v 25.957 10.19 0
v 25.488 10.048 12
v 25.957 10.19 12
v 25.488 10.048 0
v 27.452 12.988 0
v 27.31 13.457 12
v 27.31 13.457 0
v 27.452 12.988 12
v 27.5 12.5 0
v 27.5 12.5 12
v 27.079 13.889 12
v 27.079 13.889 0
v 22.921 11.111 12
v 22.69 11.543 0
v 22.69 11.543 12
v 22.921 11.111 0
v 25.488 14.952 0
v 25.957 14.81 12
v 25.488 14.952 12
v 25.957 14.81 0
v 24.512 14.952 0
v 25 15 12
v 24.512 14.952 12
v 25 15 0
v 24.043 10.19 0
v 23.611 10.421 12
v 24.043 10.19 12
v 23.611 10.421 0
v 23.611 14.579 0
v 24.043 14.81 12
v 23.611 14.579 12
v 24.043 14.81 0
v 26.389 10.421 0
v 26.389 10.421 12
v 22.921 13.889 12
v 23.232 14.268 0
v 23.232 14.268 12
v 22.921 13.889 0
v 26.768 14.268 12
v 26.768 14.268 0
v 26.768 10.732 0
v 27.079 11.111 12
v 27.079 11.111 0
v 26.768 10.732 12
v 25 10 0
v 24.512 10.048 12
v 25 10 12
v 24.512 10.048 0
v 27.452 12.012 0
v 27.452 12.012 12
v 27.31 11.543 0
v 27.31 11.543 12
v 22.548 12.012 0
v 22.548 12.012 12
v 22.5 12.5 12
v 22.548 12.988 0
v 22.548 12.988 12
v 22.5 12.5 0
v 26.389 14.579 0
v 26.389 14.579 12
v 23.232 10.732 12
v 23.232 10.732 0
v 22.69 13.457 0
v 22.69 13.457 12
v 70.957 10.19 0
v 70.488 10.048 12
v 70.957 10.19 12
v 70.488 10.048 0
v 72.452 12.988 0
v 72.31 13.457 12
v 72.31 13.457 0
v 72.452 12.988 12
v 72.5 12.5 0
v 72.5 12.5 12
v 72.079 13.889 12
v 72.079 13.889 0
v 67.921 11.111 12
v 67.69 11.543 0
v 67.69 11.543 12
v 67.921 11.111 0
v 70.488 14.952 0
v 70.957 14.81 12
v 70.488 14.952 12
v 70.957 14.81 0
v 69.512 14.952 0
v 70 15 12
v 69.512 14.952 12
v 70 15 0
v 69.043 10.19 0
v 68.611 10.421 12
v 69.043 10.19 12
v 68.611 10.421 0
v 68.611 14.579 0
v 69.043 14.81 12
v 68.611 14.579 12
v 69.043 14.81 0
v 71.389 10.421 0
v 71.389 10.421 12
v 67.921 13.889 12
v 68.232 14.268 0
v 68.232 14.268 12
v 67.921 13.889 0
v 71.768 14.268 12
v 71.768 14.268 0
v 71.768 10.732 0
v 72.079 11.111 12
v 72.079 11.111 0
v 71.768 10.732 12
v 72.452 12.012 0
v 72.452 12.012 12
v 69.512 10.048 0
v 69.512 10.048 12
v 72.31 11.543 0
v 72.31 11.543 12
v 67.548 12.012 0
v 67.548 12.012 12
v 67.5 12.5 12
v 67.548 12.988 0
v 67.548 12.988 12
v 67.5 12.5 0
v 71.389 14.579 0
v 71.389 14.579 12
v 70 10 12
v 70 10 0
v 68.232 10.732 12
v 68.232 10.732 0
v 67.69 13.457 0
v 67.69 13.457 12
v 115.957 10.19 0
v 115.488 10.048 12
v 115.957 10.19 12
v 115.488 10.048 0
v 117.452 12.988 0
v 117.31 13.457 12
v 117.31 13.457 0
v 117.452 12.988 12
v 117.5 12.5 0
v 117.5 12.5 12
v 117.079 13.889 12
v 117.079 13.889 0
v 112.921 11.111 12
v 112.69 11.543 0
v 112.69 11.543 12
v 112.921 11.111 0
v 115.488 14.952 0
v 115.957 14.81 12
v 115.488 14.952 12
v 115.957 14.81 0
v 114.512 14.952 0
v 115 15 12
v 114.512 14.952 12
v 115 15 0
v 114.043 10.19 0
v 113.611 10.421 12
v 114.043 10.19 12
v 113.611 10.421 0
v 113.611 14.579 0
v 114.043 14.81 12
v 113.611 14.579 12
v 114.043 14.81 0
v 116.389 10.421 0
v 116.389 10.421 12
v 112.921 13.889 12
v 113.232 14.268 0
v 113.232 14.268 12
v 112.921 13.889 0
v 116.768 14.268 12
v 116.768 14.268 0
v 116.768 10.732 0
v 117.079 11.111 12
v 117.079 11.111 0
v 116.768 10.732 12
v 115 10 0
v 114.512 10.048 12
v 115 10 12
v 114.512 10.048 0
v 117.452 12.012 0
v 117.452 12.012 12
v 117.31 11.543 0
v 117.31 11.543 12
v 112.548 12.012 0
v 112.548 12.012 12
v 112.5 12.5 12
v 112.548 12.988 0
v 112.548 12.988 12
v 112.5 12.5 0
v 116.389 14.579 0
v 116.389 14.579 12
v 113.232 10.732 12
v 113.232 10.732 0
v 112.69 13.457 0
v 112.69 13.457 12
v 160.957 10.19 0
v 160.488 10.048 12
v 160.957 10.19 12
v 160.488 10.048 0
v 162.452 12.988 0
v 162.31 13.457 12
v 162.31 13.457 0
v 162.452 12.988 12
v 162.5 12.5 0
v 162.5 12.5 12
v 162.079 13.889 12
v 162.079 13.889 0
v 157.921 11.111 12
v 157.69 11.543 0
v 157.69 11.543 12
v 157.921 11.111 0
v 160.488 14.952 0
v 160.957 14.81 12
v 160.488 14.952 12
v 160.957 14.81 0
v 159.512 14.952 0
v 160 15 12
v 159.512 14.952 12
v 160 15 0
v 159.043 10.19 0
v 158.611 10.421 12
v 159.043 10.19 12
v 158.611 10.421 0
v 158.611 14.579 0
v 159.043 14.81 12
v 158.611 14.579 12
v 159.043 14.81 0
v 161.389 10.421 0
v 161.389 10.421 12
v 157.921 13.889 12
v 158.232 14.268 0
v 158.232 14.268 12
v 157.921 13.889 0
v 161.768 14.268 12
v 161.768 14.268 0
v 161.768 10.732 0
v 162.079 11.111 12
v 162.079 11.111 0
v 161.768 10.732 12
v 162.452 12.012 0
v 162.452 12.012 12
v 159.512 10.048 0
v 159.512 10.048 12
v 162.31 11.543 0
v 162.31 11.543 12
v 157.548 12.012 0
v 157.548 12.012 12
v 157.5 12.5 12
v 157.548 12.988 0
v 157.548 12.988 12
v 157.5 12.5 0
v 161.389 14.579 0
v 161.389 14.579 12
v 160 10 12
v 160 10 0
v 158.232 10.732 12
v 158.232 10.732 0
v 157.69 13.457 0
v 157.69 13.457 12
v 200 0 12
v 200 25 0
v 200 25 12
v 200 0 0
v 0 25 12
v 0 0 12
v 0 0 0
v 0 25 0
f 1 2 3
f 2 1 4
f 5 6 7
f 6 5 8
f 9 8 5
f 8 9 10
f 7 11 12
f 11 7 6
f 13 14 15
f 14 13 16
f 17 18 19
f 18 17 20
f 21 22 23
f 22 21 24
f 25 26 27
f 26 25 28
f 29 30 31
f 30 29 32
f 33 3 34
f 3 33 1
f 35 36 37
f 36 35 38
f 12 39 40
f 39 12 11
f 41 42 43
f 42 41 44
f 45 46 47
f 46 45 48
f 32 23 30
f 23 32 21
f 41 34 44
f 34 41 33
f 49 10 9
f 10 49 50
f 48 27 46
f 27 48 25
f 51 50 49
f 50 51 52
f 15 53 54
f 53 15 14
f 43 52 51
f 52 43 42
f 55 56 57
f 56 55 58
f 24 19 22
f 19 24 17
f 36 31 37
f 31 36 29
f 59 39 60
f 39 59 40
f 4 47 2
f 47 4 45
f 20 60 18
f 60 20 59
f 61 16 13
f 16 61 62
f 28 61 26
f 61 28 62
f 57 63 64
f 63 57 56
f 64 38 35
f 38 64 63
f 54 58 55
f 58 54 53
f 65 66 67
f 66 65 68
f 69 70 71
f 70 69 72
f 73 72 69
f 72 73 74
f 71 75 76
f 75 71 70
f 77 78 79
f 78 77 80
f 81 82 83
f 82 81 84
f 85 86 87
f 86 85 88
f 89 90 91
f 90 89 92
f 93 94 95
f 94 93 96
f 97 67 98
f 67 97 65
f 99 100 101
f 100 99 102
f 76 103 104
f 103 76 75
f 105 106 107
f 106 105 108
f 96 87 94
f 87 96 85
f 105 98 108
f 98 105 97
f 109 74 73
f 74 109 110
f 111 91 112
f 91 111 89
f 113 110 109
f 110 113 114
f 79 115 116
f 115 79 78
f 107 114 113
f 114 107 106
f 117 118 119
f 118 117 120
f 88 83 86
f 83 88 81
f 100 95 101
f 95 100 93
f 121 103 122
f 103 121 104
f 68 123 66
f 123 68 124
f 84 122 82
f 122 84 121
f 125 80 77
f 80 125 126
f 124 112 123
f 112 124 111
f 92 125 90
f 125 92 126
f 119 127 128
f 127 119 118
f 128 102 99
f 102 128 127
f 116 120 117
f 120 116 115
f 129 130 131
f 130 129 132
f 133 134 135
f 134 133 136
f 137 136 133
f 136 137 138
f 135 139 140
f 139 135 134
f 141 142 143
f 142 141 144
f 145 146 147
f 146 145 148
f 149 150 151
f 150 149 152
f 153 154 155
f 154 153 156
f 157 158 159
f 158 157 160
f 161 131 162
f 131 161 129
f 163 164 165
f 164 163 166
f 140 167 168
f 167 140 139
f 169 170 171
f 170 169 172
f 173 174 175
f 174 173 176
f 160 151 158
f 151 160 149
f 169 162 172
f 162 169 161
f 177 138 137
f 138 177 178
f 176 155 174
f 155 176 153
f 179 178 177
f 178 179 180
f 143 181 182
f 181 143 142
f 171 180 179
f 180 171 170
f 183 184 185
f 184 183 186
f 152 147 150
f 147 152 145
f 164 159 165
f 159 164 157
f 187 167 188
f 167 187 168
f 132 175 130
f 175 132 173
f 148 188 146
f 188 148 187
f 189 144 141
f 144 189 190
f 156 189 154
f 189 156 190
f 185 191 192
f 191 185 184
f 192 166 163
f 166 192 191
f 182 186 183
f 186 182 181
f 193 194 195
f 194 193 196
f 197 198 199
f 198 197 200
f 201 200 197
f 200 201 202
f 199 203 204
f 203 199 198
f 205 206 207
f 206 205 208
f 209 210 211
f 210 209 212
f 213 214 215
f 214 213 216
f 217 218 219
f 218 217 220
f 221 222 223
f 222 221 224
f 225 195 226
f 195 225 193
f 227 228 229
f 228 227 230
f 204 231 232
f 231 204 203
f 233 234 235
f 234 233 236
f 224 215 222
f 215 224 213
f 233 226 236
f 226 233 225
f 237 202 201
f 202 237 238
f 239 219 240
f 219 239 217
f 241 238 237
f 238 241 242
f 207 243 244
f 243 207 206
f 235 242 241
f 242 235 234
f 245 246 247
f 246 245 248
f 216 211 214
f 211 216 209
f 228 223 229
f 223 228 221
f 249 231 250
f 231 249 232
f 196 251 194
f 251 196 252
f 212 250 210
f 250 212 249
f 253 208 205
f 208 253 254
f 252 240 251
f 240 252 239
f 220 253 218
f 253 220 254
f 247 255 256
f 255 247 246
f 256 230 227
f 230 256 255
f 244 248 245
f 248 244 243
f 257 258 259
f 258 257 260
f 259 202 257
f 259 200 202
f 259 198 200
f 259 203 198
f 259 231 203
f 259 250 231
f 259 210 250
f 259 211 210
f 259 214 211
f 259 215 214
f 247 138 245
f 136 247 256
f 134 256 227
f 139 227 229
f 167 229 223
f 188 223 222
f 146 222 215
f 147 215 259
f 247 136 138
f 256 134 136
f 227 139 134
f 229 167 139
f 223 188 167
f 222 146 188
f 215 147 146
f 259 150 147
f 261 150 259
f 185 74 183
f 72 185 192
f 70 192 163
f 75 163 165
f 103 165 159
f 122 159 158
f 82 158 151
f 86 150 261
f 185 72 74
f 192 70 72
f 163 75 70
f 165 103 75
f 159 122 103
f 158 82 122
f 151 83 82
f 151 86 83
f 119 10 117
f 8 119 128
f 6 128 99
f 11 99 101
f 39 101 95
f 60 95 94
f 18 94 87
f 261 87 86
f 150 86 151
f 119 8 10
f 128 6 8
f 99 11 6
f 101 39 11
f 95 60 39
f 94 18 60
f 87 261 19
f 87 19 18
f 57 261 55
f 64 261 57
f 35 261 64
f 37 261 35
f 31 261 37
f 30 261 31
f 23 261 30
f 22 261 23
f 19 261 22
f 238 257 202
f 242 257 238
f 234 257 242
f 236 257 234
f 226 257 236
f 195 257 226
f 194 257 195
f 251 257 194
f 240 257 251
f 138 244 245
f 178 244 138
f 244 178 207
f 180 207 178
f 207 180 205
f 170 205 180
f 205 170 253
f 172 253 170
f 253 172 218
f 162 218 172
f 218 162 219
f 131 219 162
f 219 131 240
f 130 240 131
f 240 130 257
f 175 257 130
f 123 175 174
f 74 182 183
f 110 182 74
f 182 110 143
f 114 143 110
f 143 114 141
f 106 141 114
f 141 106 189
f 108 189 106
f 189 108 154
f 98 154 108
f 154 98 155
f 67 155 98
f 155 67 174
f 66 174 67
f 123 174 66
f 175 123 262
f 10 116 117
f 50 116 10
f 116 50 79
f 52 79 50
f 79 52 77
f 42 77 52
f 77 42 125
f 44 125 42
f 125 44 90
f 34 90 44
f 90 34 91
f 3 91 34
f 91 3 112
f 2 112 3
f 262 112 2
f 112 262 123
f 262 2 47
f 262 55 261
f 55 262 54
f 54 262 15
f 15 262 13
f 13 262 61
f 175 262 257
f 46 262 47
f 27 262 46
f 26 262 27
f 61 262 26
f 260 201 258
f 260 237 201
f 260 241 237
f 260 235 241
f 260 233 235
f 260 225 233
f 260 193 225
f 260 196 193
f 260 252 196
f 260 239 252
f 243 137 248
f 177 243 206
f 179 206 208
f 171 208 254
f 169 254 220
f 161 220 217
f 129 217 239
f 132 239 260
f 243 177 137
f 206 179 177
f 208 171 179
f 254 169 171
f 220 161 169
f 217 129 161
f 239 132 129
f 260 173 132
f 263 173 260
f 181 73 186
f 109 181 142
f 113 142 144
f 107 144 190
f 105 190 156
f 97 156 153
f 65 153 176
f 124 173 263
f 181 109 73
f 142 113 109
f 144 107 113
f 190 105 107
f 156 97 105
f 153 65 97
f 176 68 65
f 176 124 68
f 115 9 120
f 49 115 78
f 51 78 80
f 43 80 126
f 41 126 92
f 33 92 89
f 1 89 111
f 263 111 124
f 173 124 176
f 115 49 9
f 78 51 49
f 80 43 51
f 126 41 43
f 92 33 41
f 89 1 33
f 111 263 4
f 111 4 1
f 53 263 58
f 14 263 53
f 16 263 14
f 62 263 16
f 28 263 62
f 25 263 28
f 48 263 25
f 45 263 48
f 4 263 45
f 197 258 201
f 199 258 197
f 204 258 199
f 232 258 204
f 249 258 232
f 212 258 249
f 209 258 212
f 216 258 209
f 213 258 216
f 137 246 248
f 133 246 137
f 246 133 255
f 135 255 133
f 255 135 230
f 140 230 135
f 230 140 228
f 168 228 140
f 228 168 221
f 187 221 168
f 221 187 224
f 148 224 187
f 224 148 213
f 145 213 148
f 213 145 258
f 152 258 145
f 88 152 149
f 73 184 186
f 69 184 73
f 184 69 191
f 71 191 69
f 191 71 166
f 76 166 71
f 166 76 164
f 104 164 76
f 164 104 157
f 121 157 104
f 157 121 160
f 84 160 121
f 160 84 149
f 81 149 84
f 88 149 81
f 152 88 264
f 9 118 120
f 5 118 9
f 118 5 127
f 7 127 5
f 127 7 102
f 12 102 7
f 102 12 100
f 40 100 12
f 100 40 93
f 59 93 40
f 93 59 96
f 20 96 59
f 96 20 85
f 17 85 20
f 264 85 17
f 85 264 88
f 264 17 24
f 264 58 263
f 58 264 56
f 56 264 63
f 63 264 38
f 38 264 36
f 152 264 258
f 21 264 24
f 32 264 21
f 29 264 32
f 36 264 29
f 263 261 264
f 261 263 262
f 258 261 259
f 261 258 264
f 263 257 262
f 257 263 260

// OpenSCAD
$fn = 32;

// ----------------------------------------------------------------------
// Long rail: 200-250 mm mounting rail
// ----------------------------------------------------------------------

// --- parameters (mm) ---
rail_l = 200;             // rail length, X
rail_w = 25;              // rail width, Y
rail_t = 12;              // rail thickness, Z
hole_d = 5;               // mounting hole diameter
hole_start = 25;          // first hole offset from the end
hole_pitch = 45;          // hole pitch
holes = 4;                // number of holes

difference() {
  cube([rail_l, rail_w, rail_t]);
  for (i = [0 : holes - 1])
    translate([hole_start + i * hole_pitch, rail_w / 2, -1])
      cylinder(h = rail_t + 2, d = hole_d);
}
